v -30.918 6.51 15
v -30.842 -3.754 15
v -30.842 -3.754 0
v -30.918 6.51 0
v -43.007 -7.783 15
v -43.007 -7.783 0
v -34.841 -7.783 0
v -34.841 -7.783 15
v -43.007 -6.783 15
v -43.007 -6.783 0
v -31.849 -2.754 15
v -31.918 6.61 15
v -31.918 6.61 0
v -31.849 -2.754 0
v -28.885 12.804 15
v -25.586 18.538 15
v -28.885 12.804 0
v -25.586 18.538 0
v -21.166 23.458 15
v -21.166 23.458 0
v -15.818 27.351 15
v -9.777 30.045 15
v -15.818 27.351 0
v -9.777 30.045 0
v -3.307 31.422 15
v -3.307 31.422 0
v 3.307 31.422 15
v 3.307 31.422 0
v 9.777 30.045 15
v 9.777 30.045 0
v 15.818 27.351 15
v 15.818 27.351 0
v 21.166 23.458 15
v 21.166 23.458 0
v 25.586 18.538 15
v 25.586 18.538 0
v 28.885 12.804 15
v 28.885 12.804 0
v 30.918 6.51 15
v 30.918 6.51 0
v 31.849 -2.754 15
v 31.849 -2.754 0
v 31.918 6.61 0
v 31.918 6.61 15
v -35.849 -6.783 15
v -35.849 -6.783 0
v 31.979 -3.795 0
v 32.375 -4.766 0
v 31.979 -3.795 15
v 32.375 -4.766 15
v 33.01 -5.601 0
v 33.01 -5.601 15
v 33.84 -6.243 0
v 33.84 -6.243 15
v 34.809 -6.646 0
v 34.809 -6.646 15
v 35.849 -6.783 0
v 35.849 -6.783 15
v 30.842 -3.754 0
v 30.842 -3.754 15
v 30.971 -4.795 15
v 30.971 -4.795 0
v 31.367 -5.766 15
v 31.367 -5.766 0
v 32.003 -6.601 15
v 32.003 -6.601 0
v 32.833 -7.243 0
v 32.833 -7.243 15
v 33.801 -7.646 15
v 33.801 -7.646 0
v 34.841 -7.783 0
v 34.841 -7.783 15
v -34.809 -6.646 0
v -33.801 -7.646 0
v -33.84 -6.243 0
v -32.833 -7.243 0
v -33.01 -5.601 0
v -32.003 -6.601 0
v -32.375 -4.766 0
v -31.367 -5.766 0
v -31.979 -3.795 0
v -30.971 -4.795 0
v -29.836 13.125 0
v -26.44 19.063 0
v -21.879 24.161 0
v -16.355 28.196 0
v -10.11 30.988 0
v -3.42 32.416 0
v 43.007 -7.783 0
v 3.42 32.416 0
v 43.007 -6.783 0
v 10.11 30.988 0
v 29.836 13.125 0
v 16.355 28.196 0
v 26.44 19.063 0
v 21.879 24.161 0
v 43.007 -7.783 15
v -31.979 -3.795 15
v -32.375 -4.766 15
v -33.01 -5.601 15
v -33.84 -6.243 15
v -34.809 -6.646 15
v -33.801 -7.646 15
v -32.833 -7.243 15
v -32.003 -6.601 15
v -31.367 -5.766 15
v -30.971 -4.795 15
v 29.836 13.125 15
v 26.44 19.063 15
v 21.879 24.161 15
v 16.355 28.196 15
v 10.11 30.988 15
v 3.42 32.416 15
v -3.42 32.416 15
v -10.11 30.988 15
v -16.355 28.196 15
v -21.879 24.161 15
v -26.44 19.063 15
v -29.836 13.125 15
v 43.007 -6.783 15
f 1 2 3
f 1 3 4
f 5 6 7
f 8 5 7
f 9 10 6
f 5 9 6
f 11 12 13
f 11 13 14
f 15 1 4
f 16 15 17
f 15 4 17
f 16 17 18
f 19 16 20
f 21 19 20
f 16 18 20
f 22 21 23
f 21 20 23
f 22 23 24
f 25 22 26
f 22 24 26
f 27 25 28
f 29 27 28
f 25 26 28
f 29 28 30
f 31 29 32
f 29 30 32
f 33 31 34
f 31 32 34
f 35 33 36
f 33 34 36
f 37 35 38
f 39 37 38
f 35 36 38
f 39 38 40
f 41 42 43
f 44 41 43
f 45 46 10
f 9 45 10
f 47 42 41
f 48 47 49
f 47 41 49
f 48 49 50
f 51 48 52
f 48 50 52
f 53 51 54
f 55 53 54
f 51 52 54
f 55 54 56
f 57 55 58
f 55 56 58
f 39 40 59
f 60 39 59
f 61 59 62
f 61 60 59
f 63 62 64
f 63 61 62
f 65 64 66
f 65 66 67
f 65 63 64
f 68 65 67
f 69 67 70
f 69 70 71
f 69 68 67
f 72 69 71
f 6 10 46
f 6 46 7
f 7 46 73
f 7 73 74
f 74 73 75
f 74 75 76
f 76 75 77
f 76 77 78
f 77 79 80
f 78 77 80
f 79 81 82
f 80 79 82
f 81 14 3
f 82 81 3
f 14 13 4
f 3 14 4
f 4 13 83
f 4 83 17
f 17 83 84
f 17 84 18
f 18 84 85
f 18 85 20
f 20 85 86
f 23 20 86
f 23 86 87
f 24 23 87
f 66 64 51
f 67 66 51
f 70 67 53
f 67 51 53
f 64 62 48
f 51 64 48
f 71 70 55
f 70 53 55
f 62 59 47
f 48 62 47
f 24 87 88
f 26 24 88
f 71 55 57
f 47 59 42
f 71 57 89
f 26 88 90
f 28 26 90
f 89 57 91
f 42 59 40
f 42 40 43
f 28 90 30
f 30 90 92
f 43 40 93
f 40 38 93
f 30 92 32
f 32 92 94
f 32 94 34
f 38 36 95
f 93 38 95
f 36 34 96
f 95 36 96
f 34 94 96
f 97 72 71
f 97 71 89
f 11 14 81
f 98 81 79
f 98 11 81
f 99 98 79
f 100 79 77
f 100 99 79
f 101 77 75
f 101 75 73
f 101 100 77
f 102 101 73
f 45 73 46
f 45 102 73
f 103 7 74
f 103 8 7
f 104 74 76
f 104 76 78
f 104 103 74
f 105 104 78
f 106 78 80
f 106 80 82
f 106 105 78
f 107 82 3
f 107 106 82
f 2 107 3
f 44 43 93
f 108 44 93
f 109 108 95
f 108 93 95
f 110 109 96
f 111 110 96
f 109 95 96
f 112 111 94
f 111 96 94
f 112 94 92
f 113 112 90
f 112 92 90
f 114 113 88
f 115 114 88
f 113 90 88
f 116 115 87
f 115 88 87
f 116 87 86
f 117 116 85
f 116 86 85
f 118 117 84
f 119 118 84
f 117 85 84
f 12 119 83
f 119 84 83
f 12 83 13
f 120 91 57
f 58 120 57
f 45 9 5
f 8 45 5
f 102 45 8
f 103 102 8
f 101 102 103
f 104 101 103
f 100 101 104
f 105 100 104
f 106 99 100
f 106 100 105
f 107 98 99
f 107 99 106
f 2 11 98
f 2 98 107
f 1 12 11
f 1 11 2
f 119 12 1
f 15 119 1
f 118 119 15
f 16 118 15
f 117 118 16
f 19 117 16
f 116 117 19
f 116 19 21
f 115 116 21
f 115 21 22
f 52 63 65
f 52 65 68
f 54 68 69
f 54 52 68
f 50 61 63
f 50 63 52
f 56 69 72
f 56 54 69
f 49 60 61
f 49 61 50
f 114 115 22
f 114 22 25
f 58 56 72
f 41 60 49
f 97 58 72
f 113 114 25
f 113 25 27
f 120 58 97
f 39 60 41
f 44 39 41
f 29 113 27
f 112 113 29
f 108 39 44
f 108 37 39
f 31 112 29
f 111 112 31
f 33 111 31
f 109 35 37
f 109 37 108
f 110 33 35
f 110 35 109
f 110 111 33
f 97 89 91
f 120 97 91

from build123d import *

# Parameters (mm, degrees)
EXTRUDE_1_DEPTH = 15
FILLET_1_R      = 4
FILLET_2_R      = 4
FILLET_3_R      = 4


with BuildPart() as part:
    # Эскиз8 → Вытянуть-Тонкостенный1 (new body)
    with BuildSketch(Plane.XY):
        with BuildLine():
            Line((43.007359098, -6.783419957), (31.819109934, -6.783419957))
            Line((31.819109934, -6.783419957), (31.9183647, 6.609638135))
            ThreePointArc((31.9183647, 6.609638135), (0, 32.595541435), (-31.9183647, 6.609638135))
            Line((-31.9183647, 6.609638135), (-31.819109934, -6.783419957))
            Line((-31.819109934, -6.783419957), (-43.007359098, -6.783419957))
            Line((-43.007359098, -6.783419957), (-43.007359098, -7.783419957))
            Line((-43.007359098, -7.783419957), (-30.811671563, -7.783419957))
            Line((-30.811671563, -7.783419957), (-30.917598952, 6.510016405))
            ThreePointArc((-30.917598952, 6.510016405), (0, 31.595541435), (30.917598952, 6.510016405))
            Line((30.917598952, 6.510016405), (30.811671563, -7.783419957))
            Line((30.811671563, -7.783419957), (43.007359098, -7.783419957))
            Line((43.007359098, -7.783419957), (43.007359098, -6.783419957))
        make_face()
    extrude(amount=EXTRUDE_1_DEPTH)

    # Скругление1
    fillet_1_edges = [part.edges().sort_by_distance(p)[0] for p in [
        (-31.819109934, -6.783419957, 7.5),
    ]]
    fillet(fillet_1_edges, radius=FILLET_1_R)

    # Скругление2
    fillet_2_edges = [part.edges().sort_by_distance(p)[0] for p in [
        (-30.811671563, -7.783419957, 7.5),
    ]]
    fillet(fillet_2_edges, radius=FILLET_2_R)

    # Скругление3
    fillet_3_edges = [part.edges().sort_by_distance(p)[0] for p in [
        (30.811671563, -7.783419957, 7.5),
        (31.819109934, -6.783419957, 7.5),
    ]]
    fillet(fillet_3_edges, radius=FILLET_3_R)


solid = part.part
